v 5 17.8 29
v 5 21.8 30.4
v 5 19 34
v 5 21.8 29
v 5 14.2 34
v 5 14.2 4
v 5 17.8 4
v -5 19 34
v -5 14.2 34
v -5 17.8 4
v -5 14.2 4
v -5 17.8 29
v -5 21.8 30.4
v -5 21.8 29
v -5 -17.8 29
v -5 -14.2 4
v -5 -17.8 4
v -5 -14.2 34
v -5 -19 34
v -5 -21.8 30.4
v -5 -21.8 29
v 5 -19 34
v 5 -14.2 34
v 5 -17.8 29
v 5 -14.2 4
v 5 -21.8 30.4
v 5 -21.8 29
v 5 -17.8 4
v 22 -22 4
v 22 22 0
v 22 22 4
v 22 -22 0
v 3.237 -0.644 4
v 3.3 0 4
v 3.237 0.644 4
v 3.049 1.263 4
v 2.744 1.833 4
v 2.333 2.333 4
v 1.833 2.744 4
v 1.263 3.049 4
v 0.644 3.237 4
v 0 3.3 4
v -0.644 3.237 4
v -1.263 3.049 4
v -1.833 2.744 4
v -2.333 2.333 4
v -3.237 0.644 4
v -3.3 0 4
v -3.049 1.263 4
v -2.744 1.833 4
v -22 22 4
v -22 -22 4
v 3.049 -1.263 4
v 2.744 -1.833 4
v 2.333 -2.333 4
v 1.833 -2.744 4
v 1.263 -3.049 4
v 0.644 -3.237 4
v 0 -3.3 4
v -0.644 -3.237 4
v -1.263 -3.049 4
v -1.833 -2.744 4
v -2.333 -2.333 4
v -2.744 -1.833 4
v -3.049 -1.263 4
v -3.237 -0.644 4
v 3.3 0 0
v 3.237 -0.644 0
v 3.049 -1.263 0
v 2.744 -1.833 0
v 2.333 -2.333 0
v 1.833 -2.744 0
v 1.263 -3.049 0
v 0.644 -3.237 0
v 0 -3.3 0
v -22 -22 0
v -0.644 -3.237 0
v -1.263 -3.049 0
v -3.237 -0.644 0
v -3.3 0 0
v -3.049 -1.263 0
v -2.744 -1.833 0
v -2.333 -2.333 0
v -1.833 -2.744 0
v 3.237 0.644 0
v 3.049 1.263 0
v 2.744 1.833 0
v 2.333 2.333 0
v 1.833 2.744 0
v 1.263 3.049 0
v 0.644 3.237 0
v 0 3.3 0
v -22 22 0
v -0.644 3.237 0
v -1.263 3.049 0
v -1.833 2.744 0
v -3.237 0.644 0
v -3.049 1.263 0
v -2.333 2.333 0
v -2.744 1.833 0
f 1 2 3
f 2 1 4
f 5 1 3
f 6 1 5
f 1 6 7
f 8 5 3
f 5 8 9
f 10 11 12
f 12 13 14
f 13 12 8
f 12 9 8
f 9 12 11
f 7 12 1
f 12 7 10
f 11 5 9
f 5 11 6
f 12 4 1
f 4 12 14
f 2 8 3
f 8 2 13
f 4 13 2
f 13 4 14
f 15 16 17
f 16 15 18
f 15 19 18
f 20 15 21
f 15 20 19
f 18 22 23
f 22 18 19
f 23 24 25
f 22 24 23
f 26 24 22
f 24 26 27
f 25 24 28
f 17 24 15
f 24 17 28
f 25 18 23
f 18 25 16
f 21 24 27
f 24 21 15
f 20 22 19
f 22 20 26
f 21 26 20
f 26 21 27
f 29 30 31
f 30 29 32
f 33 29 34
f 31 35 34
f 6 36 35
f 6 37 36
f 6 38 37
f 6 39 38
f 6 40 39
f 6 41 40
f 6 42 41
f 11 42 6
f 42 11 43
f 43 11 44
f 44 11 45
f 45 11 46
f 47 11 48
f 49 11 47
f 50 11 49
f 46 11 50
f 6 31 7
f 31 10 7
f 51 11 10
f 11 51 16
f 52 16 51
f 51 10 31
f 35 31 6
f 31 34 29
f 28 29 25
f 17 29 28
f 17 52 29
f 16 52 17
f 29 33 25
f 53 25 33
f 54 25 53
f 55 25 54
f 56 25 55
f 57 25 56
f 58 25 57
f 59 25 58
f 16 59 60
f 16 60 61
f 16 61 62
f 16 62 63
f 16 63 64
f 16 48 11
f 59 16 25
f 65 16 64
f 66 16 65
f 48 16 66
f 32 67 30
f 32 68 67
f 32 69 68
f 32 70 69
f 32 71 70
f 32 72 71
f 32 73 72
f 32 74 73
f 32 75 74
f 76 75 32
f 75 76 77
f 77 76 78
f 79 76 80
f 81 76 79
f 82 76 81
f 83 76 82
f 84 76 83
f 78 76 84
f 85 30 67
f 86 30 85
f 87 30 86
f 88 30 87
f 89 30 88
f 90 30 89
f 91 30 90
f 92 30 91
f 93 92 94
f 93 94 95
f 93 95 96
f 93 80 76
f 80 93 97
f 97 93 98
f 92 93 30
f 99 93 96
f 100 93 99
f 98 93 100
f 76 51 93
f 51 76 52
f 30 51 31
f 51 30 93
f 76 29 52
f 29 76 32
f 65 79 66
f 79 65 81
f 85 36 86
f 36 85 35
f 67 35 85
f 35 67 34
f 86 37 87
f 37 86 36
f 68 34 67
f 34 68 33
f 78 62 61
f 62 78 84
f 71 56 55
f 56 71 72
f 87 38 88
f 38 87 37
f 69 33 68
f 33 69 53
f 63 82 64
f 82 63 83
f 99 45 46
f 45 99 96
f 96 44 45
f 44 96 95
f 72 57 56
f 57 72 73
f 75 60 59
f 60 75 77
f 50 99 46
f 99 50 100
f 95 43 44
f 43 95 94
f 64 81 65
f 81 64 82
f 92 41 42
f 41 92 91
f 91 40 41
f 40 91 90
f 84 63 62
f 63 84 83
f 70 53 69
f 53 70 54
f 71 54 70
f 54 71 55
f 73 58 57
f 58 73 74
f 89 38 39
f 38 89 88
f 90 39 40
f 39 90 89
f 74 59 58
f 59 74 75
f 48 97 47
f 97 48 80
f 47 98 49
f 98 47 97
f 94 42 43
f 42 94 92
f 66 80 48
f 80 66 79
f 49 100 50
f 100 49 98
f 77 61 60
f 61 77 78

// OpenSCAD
$fn = 32;

// ----------------------------------------------------------------------
// Snap-fit latch: 2 arms, 30 mm tall, 4.2 mm undercut hooks
// ----------------------------------------------------------------------

// --- parameters (mm) ---
base_d = 44;              // base plate depth
base_h = 4;               // base plate thickness
span = 32;                // distance between opposite arms
arm_t = 3.6;              // arm thickness
arm_d = 10;               // arm width
height = 30;              // free arm length
head_len = 4.2;           // hook reach
head_h = 5;               // hook height
lead = 1.4;               // lead-in ramp thickness
bore_d = 6.6;             // base fixing bore
top_z = 34;               // height of the arm tips above the base

arms = 2;

difference() {
  union() {
    /* base plate, centred on the arm ring */
    translate([-22, -22, 0]) cube([base_d, base_d, base_h]);
    for (a = [0 : 360 / arms : 359]) rotate([0, 0, a]) {
    /* arm, sunk 0.5 mm into the base */
    translate([-arm_d / 2, span / 2 - arm_t / 2, base_h - 0.5]) cube([arm_d, arm_t, height + 0.5]);
    /* hook: a convex hull of a tall inner block and a thin outer lip
       gives a flat undercut below and a lead-in ramp on top */
    hull() {
      translate([-arm_d / 2, span / 2 + arm_t / 2 - 0.6, top_z - head_h]) cube([arm_d, lead + 0.4, head_h]);
      translate([-arm_d / 2, span / 2 + arm_t / 2 - 0.2, top_z - head_h]) cube([arm_d, head_len, lead]);
    }
    }
  }
  translate([0, 0, -2.5]) cylinder(h = base_h + 5, d = bore_d);
}
